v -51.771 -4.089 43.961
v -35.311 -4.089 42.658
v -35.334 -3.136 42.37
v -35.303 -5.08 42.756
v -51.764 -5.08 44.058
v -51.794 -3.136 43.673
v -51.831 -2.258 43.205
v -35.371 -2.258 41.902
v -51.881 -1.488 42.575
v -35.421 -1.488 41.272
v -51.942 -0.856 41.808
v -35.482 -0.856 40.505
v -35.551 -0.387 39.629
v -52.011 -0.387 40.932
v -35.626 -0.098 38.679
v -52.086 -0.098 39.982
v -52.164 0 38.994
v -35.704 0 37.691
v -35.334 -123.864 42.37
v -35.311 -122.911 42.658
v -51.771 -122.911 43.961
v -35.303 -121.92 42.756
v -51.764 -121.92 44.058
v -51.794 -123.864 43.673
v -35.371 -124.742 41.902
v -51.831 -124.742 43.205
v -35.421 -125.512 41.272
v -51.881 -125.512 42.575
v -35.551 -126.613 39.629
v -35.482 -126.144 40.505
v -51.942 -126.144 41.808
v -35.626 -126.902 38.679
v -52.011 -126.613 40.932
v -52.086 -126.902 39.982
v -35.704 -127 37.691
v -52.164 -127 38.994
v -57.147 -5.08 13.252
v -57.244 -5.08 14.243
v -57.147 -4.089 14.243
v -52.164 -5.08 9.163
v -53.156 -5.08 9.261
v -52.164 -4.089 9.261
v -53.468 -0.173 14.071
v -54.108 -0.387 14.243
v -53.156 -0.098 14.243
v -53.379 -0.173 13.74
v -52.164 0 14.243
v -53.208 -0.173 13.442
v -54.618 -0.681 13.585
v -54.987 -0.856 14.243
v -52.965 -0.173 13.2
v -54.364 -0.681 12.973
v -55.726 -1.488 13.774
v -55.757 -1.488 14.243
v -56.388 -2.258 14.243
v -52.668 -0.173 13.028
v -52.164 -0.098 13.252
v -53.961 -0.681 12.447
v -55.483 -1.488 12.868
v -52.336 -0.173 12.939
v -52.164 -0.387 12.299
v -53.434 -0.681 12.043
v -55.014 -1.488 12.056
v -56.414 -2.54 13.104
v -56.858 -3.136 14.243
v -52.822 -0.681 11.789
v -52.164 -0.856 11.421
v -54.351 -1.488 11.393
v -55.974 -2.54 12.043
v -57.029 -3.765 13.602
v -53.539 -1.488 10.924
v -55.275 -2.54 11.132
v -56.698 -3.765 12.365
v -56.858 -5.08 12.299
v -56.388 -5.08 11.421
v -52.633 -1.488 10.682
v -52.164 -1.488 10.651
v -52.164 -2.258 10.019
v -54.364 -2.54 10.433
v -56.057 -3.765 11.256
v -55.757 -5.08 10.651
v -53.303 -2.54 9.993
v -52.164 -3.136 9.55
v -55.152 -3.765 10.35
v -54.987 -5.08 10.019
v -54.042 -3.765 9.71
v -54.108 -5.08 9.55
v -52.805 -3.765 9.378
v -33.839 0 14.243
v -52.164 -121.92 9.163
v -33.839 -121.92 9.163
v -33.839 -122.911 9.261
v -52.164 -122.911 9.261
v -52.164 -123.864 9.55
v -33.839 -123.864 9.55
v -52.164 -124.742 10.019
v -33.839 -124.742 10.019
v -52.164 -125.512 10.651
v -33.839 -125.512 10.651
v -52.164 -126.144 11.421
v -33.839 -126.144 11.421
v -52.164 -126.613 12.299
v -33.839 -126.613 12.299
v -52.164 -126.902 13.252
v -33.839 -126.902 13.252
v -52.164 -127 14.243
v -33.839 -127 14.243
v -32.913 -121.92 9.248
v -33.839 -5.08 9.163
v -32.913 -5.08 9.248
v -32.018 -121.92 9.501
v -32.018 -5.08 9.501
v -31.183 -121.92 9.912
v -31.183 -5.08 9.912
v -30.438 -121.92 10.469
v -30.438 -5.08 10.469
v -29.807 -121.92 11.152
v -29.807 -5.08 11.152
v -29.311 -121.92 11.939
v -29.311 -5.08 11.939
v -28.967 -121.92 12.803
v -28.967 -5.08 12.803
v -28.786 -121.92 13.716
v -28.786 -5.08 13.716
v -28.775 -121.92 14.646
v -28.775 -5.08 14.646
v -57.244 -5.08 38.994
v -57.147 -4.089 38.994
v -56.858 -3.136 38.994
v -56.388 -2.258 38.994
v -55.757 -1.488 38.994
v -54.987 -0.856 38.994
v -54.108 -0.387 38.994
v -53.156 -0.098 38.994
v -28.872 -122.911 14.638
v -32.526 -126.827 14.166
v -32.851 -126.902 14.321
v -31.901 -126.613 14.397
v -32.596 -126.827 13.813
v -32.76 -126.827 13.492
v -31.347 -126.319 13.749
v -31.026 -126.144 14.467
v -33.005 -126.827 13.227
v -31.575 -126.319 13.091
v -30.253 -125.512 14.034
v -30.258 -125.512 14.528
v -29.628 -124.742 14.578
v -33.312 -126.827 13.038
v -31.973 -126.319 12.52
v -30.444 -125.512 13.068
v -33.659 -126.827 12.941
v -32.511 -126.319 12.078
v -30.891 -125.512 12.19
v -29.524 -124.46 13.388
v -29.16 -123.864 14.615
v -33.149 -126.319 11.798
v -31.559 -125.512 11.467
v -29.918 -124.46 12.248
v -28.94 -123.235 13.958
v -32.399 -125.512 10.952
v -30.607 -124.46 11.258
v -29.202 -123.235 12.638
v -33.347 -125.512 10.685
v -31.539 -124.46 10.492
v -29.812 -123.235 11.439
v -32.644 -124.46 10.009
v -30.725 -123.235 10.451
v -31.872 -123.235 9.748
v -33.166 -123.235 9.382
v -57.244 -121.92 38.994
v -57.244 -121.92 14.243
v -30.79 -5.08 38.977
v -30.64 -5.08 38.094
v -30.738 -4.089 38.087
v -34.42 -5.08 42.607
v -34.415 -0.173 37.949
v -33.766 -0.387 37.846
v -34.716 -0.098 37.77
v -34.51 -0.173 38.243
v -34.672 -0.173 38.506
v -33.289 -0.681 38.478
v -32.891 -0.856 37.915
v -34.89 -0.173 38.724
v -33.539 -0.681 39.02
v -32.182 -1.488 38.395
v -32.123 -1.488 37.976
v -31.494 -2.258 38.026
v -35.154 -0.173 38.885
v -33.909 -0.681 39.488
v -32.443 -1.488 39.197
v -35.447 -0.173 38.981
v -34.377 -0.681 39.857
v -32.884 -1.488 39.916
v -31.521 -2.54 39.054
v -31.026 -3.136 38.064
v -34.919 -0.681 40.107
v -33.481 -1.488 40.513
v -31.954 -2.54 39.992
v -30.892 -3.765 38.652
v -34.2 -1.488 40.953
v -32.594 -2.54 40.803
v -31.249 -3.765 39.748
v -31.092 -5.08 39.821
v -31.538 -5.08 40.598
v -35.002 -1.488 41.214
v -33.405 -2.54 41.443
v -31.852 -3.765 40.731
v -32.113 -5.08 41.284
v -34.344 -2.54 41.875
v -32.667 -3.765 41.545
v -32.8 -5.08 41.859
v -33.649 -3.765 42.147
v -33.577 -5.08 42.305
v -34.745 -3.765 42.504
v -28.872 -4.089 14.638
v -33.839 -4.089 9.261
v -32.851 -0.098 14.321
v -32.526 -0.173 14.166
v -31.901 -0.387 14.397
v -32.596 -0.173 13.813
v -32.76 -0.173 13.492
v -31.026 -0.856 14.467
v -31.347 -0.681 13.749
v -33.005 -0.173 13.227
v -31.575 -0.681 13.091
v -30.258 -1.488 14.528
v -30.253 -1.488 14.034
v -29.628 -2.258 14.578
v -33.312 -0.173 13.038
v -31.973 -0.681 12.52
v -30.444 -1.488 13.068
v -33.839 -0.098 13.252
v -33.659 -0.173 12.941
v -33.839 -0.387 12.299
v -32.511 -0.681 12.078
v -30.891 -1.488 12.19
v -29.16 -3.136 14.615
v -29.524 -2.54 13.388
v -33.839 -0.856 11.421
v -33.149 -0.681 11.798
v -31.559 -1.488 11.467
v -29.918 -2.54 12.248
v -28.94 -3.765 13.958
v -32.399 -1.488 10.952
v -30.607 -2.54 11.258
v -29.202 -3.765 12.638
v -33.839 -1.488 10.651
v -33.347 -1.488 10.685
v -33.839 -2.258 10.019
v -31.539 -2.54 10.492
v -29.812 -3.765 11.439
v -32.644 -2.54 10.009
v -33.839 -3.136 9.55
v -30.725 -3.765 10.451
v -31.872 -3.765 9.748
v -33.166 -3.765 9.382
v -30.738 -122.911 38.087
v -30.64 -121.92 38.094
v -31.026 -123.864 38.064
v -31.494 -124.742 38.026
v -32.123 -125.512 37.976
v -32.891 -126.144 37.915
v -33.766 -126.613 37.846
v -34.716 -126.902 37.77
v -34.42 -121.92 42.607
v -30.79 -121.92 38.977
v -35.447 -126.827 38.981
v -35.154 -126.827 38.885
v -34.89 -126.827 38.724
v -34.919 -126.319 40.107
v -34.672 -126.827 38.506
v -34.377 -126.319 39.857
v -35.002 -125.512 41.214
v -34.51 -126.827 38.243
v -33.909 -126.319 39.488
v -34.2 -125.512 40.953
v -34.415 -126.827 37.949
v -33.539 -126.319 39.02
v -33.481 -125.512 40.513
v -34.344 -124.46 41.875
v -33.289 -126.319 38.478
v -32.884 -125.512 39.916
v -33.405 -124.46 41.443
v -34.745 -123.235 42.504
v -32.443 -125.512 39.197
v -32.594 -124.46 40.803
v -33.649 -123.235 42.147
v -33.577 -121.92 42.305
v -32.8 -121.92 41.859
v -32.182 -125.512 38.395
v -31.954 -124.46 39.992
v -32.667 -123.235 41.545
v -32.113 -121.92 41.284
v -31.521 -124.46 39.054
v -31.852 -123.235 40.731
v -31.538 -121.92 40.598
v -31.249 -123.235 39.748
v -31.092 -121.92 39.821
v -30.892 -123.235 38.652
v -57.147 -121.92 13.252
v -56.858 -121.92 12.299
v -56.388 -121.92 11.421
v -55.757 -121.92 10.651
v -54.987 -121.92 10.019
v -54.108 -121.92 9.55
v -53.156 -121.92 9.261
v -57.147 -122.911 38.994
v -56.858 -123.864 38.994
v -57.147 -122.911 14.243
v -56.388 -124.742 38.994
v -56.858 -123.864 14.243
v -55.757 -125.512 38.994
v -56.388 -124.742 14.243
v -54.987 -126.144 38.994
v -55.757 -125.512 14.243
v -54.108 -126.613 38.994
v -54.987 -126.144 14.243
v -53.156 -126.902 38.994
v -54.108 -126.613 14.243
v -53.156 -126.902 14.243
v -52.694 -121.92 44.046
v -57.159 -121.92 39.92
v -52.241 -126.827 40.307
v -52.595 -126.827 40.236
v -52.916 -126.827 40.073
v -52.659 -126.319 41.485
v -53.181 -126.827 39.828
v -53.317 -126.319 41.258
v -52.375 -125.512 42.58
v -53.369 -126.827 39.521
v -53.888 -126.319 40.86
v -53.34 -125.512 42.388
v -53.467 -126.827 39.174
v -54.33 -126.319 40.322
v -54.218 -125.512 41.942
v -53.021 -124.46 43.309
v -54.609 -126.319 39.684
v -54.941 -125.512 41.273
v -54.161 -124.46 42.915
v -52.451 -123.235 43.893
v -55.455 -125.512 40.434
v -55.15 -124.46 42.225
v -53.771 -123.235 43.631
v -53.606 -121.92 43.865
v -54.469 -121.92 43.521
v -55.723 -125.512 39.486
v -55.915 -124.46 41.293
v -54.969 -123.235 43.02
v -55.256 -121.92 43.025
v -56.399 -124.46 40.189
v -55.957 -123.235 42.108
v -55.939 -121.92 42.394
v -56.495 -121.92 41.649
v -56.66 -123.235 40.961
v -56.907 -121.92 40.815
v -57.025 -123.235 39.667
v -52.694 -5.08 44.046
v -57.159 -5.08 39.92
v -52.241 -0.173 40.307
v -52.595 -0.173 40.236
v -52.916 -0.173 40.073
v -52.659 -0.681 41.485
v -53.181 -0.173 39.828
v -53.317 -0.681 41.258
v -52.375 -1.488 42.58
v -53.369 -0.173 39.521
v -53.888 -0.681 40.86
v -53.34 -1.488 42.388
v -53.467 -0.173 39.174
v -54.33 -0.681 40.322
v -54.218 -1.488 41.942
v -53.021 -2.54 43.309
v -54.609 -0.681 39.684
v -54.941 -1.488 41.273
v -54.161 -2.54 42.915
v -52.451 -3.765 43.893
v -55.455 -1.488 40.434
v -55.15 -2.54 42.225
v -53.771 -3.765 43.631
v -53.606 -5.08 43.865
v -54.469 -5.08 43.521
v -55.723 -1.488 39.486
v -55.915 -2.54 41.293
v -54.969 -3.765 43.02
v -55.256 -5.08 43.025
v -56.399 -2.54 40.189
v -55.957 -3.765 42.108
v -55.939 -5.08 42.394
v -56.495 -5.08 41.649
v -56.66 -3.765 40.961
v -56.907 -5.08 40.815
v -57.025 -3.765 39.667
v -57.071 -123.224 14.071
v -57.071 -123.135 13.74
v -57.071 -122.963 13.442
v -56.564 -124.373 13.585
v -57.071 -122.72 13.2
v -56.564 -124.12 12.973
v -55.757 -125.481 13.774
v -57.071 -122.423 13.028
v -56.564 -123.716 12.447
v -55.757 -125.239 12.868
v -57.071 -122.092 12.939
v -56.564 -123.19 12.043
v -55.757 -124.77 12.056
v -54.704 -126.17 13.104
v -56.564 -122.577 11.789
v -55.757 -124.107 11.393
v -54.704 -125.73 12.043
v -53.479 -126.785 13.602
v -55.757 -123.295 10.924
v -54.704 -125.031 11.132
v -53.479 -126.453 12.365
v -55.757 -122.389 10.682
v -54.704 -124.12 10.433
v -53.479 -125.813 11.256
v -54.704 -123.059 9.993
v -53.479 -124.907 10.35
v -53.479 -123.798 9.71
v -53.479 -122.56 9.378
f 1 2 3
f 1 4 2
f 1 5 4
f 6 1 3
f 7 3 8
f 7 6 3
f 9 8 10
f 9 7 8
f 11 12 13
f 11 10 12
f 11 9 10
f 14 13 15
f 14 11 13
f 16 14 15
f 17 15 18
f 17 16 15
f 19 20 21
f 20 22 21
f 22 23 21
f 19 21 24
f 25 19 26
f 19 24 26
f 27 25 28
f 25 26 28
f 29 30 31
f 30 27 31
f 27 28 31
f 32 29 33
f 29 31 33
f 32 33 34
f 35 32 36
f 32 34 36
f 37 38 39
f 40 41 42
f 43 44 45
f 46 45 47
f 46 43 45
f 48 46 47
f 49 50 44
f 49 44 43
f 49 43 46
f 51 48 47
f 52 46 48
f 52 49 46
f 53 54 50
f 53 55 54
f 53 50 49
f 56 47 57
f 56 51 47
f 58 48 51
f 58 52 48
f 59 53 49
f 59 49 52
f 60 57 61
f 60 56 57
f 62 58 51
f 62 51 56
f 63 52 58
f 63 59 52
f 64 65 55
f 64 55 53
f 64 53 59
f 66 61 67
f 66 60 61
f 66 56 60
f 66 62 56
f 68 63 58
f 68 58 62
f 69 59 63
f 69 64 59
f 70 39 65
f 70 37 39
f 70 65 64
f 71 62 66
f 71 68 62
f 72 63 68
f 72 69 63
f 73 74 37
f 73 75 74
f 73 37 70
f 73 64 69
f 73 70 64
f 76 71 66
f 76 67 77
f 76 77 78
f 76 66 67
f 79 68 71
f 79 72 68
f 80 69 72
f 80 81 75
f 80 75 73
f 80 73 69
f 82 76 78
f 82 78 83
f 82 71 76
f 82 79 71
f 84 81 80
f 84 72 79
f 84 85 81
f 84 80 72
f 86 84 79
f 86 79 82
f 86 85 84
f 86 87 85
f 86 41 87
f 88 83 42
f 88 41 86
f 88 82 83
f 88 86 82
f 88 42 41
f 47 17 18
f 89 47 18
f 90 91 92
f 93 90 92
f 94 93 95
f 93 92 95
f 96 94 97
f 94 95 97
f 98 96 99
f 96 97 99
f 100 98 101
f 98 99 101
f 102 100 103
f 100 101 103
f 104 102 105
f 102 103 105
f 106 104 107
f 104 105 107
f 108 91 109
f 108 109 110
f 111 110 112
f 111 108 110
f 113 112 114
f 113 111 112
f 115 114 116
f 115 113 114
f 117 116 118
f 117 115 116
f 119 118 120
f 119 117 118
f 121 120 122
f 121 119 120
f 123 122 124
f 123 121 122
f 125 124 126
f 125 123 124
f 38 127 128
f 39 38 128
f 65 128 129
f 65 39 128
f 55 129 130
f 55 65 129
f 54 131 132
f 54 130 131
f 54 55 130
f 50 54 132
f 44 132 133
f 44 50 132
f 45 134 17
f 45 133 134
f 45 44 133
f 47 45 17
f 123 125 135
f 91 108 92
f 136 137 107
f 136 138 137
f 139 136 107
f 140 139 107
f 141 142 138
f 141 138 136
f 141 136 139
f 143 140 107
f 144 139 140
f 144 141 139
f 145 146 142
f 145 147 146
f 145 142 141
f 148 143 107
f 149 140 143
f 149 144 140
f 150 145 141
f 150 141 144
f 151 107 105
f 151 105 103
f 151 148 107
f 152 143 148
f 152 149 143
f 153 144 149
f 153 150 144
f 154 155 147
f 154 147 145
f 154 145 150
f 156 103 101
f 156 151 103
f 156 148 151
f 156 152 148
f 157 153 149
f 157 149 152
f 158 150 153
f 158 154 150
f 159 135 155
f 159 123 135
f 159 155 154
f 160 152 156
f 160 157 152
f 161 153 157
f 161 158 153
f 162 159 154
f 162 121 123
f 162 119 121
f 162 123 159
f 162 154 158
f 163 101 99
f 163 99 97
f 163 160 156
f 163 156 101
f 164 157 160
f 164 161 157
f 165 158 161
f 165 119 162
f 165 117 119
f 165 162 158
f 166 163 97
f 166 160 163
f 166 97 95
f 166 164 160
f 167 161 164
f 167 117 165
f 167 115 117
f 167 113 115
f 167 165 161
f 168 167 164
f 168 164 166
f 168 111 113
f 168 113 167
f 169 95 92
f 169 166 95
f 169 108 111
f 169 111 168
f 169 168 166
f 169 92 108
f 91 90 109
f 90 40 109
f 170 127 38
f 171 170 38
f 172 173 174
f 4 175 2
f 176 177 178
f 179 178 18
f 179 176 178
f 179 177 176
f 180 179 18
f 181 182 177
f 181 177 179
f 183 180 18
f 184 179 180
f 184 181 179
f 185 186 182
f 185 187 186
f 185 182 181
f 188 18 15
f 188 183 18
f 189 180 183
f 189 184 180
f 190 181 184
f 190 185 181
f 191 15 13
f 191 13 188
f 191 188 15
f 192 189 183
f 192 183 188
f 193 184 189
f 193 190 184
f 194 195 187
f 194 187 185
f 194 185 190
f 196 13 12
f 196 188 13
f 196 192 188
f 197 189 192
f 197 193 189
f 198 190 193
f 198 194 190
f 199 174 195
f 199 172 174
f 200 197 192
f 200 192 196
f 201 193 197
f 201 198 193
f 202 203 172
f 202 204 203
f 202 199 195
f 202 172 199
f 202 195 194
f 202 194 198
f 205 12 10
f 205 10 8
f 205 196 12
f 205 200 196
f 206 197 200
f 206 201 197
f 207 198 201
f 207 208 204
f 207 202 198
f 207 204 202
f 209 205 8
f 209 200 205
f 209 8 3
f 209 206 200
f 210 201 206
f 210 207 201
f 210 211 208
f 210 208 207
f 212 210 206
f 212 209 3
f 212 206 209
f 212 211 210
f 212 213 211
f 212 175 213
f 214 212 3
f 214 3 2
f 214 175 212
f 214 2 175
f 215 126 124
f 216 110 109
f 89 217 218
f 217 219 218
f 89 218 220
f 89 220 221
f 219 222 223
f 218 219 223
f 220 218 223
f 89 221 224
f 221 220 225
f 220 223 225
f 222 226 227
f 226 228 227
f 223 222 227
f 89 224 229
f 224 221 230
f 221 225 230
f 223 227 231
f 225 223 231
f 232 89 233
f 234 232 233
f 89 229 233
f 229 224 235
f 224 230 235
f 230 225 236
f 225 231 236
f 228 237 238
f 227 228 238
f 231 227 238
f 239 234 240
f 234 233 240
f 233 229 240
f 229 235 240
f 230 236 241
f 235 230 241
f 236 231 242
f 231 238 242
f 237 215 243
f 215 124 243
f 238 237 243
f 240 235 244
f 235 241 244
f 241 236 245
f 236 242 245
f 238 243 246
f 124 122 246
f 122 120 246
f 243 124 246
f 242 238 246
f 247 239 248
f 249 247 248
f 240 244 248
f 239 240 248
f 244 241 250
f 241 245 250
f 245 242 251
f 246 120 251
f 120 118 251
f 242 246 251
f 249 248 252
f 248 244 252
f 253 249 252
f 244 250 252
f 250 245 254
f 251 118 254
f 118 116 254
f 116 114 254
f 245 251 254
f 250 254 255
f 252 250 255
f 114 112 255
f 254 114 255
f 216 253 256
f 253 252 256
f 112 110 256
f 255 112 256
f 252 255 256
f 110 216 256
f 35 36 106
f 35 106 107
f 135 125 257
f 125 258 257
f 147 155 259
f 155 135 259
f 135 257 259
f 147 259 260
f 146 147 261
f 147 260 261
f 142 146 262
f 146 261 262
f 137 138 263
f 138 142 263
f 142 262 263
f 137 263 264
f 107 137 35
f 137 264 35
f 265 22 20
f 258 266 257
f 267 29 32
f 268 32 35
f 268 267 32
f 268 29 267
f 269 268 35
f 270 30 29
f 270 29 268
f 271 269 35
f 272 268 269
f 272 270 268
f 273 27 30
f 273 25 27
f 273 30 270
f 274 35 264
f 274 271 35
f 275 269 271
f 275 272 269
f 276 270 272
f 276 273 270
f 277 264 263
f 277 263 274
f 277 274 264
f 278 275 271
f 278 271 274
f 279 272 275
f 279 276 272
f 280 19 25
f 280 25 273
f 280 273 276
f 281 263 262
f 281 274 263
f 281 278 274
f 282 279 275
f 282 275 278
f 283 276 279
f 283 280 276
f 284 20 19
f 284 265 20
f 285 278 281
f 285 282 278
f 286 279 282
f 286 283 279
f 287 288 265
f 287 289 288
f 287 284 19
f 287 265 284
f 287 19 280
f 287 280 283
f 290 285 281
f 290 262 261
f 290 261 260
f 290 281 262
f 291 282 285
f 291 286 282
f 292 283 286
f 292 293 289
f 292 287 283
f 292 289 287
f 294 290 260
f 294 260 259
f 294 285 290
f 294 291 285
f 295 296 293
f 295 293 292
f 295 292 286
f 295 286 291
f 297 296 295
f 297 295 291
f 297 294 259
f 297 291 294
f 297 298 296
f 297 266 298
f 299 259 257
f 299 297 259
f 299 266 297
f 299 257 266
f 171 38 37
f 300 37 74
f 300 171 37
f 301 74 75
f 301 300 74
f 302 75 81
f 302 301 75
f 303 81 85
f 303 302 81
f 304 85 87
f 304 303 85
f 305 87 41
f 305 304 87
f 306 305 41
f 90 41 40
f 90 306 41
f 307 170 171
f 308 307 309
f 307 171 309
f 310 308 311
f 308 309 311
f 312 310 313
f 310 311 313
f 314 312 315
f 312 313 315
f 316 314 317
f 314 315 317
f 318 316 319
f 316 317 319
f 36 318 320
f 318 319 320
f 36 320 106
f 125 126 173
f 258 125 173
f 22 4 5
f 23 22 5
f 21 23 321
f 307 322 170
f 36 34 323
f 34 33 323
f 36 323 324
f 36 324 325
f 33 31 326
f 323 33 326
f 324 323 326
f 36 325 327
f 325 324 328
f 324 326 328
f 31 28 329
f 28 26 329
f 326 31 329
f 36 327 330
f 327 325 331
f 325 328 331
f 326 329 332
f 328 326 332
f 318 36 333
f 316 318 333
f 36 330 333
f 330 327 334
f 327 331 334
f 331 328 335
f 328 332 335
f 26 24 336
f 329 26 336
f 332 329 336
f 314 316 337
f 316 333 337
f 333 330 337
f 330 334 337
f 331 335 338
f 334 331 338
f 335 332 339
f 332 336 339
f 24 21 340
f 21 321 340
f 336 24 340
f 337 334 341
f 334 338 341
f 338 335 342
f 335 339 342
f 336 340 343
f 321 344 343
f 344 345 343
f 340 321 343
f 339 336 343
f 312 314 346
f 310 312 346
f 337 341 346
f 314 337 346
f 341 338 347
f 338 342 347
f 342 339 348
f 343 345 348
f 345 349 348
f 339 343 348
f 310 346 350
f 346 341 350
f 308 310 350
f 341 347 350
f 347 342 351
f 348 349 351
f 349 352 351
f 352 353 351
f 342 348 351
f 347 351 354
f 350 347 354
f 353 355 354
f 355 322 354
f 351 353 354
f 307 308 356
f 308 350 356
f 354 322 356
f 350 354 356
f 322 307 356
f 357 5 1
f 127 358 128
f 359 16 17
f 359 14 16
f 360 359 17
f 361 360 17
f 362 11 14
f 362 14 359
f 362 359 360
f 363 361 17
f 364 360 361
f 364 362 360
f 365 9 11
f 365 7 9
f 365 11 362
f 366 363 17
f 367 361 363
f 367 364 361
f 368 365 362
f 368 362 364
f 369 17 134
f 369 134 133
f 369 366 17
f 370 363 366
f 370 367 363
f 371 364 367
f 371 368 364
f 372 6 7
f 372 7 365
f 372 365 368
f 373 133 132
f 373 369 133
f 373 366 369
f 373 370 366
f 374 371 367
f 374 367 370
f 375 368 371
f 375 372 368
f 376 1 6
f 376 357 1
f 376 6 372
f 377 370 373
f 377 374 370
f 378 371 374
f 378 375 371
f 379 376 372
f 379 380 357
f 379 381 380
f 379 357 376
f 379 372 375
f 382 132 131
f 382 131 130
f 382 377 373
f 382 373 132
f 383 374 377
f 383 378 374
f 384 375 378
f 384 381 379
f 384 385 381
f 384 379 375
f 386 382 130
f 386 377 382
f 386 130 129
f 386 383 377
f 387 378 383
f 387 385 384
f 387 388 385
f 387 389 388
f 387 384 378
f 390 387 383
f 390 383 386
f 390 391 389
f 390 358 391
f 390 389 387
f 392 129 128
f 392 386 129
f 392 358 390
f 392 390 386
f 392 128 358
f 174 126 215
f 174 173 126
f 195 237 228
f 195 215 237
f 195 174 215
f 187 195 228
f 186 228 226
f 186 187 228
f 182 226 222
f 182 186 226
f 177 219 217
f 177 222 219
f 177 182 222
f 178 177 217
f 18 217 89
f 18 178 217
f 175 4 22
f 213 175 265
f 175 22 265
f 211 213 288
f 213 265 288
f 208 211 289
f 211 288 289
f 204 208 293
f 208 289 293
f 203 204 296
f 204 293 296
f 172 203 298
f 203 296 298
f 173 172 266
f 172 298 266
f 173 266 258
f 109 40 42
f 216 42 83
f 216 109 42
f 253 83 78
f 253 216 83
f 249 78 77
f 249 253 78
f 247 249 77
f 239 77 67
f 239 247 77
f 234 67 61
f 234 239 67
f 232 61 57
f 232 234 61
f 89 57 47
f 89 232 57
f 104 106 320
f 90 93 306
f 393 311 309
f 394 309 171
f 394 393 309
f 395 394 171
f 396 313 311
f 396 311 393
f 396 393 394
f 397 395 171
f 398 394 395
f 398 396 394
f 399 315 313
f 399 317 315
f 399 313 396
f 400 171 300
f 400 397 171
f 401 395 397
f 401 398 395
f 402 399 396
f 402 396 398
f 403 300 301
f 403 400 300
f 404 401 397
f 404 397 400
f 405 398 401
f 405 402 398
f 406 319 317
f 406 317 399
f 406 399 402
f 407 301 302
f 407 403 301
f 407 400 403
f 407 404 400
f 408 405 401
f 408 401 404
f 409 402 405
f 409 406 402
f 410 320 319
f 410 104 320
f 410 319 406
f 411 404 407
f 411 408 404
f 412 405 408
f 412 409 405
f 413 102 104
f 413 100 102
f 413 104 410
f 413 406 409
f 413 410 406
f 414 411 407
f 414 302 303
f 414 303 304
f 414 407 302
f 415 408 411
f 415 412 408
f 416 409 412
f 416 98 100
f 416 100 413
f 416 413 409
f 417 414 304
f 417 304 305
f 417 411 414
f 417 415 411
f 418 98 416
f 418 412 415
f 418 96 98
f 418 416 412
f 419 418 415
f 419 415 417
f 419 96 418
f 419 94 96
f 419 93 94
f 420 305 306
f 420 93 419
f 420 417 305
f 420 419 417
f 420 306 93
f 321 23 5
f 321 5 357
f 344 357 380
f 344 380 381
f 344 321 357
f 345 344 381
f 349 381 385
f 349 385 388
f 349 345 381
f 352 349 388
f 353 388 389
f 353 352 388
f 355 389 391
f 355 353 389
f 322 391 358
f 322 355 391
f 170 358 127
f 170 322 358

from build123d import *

# Parameters (mm, degrees)
F1_DEPTH = 127
F2_R     = 5.08


with BuildPart() as f1:
    # F0 (on Front) → F1 (new body)
    with BuildSketch(Plane.XZ):
        Polygon((-30.983802, 42.413801), (-57.244465, 44.491984), (-57.244465, 9.162893), (-28.338844, 9.162893), align=None)
    extrude(amount=F1_DEPTH)

    # F2
    f2_edges = [f1.edges().sort_by_distance(p)[0] for p in [
        (-30.983802, -63.5, 42.413801),
        (-57.244465, -63.5, 44.491984),
        (-44.114133, -127, 43.452892),
        (-29.661323, -127, 25.788347),
        (-42.791654, -127, 9.162893),
        (-57.244465, -127, 26.827438),
        (-28.338844, -63.5, 9.162893),
        (-57.244465, -63.5, 9.162893),
        (-29.661323, 0, 25.788347),
        (-44.114133, 0, 43.452892),
        (-57.244465, 0, 26.827438),
        (-42.791654, 0, 9.162893),
    ]]
    fillet(f2_edges, radius=F2_R)


solid = f1.part
